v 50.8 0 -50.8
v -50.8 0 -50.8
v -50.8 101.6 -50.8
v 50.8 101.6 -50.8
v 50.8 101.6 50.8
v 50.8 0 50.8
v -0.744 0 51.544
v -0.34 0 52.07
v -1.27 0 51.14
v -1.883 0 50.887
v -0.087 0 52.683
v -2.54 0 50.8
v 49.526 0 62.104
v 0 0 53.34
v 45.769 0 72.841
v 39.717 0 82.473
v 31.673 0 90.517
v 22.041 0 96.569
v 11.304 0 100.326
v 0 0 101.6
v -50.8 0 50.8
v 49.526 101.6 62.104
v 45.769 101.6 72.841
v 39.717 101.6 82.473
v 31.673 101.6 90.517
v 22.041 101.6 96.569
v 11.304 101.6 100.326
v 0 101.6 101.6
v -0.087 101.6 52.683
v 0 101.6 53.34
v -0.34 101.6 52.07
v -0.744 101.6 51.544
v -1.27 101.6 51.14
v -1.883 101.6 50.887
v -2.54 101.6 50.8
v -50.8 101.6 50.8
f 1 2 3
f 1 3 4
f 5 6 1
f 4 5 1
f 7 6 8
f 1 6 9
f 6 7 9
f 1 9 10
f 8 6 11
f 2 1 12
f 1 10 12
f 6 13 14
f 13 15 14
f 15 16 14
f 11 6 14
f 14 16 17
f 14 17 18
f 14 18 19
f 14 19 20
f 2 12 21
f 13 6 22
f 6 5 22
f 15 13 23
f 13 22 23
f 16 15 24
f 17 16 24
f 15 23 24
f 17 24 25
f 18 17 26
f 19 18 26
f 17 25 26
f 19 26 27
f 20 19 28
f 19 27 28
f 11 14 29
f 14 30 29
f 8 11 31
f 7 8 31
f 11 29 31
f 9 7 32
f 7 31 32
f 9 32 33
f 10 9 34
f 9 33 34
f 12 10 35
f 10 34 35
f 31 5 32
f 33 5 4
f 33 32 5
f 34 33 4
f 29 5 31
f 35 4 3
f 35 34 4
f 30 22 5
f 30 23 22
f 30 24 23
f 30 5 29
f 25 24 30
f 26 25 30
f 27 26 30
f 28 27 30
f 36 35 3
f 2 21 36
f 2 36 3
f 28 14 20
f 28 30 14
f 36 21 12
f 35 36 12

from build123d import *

# Parameters (mm, degrees)
SKETCH1_W           = 101.6
SKETCH1_H           = 101.6
BOSS_EXTRUDE1_DEPTH = 101.6
SKETCH3_W           = 50.8
SKETCH3_H           = 101.6
REVOLVE1_ANGLE      = 90
FILLET1_R           = 2.54


with BuildPart() as part:
    # Sketch1 → Boss-Extrude1 (new body)
    with BuildSketch(Plane(origin=(0, 0, 0), x_dir=(1, 0, 0), z_dir=(0, 1, 0))):
        Rectangle(SKETCH1_W, SKETCH1_H)
    extrude(amount=BOSS_EXTRUDE1_DEPTH)

    # Sketch3 → Revolve1 (revolve)
    with BuildSketch(Plane.XY.offset(50.8)):
        with Locations((25.4, 50.8)):
            Rectangle(SKETCH3_W, SKETCH3_H)
    revolve(axis=Axis((0, 0, 50.8), (0, -1, 0)), revolution_arc=REVOLVE1_ANGLE)

    # Fillet1
    fillet1_edges = [part.edges().sort_by_distance(p)[0] for p in [
        (0, 50.8, 50.8),
    ]]
    fillet(fillet1_edges, radius=FILLET1_R)


solid = part.part
